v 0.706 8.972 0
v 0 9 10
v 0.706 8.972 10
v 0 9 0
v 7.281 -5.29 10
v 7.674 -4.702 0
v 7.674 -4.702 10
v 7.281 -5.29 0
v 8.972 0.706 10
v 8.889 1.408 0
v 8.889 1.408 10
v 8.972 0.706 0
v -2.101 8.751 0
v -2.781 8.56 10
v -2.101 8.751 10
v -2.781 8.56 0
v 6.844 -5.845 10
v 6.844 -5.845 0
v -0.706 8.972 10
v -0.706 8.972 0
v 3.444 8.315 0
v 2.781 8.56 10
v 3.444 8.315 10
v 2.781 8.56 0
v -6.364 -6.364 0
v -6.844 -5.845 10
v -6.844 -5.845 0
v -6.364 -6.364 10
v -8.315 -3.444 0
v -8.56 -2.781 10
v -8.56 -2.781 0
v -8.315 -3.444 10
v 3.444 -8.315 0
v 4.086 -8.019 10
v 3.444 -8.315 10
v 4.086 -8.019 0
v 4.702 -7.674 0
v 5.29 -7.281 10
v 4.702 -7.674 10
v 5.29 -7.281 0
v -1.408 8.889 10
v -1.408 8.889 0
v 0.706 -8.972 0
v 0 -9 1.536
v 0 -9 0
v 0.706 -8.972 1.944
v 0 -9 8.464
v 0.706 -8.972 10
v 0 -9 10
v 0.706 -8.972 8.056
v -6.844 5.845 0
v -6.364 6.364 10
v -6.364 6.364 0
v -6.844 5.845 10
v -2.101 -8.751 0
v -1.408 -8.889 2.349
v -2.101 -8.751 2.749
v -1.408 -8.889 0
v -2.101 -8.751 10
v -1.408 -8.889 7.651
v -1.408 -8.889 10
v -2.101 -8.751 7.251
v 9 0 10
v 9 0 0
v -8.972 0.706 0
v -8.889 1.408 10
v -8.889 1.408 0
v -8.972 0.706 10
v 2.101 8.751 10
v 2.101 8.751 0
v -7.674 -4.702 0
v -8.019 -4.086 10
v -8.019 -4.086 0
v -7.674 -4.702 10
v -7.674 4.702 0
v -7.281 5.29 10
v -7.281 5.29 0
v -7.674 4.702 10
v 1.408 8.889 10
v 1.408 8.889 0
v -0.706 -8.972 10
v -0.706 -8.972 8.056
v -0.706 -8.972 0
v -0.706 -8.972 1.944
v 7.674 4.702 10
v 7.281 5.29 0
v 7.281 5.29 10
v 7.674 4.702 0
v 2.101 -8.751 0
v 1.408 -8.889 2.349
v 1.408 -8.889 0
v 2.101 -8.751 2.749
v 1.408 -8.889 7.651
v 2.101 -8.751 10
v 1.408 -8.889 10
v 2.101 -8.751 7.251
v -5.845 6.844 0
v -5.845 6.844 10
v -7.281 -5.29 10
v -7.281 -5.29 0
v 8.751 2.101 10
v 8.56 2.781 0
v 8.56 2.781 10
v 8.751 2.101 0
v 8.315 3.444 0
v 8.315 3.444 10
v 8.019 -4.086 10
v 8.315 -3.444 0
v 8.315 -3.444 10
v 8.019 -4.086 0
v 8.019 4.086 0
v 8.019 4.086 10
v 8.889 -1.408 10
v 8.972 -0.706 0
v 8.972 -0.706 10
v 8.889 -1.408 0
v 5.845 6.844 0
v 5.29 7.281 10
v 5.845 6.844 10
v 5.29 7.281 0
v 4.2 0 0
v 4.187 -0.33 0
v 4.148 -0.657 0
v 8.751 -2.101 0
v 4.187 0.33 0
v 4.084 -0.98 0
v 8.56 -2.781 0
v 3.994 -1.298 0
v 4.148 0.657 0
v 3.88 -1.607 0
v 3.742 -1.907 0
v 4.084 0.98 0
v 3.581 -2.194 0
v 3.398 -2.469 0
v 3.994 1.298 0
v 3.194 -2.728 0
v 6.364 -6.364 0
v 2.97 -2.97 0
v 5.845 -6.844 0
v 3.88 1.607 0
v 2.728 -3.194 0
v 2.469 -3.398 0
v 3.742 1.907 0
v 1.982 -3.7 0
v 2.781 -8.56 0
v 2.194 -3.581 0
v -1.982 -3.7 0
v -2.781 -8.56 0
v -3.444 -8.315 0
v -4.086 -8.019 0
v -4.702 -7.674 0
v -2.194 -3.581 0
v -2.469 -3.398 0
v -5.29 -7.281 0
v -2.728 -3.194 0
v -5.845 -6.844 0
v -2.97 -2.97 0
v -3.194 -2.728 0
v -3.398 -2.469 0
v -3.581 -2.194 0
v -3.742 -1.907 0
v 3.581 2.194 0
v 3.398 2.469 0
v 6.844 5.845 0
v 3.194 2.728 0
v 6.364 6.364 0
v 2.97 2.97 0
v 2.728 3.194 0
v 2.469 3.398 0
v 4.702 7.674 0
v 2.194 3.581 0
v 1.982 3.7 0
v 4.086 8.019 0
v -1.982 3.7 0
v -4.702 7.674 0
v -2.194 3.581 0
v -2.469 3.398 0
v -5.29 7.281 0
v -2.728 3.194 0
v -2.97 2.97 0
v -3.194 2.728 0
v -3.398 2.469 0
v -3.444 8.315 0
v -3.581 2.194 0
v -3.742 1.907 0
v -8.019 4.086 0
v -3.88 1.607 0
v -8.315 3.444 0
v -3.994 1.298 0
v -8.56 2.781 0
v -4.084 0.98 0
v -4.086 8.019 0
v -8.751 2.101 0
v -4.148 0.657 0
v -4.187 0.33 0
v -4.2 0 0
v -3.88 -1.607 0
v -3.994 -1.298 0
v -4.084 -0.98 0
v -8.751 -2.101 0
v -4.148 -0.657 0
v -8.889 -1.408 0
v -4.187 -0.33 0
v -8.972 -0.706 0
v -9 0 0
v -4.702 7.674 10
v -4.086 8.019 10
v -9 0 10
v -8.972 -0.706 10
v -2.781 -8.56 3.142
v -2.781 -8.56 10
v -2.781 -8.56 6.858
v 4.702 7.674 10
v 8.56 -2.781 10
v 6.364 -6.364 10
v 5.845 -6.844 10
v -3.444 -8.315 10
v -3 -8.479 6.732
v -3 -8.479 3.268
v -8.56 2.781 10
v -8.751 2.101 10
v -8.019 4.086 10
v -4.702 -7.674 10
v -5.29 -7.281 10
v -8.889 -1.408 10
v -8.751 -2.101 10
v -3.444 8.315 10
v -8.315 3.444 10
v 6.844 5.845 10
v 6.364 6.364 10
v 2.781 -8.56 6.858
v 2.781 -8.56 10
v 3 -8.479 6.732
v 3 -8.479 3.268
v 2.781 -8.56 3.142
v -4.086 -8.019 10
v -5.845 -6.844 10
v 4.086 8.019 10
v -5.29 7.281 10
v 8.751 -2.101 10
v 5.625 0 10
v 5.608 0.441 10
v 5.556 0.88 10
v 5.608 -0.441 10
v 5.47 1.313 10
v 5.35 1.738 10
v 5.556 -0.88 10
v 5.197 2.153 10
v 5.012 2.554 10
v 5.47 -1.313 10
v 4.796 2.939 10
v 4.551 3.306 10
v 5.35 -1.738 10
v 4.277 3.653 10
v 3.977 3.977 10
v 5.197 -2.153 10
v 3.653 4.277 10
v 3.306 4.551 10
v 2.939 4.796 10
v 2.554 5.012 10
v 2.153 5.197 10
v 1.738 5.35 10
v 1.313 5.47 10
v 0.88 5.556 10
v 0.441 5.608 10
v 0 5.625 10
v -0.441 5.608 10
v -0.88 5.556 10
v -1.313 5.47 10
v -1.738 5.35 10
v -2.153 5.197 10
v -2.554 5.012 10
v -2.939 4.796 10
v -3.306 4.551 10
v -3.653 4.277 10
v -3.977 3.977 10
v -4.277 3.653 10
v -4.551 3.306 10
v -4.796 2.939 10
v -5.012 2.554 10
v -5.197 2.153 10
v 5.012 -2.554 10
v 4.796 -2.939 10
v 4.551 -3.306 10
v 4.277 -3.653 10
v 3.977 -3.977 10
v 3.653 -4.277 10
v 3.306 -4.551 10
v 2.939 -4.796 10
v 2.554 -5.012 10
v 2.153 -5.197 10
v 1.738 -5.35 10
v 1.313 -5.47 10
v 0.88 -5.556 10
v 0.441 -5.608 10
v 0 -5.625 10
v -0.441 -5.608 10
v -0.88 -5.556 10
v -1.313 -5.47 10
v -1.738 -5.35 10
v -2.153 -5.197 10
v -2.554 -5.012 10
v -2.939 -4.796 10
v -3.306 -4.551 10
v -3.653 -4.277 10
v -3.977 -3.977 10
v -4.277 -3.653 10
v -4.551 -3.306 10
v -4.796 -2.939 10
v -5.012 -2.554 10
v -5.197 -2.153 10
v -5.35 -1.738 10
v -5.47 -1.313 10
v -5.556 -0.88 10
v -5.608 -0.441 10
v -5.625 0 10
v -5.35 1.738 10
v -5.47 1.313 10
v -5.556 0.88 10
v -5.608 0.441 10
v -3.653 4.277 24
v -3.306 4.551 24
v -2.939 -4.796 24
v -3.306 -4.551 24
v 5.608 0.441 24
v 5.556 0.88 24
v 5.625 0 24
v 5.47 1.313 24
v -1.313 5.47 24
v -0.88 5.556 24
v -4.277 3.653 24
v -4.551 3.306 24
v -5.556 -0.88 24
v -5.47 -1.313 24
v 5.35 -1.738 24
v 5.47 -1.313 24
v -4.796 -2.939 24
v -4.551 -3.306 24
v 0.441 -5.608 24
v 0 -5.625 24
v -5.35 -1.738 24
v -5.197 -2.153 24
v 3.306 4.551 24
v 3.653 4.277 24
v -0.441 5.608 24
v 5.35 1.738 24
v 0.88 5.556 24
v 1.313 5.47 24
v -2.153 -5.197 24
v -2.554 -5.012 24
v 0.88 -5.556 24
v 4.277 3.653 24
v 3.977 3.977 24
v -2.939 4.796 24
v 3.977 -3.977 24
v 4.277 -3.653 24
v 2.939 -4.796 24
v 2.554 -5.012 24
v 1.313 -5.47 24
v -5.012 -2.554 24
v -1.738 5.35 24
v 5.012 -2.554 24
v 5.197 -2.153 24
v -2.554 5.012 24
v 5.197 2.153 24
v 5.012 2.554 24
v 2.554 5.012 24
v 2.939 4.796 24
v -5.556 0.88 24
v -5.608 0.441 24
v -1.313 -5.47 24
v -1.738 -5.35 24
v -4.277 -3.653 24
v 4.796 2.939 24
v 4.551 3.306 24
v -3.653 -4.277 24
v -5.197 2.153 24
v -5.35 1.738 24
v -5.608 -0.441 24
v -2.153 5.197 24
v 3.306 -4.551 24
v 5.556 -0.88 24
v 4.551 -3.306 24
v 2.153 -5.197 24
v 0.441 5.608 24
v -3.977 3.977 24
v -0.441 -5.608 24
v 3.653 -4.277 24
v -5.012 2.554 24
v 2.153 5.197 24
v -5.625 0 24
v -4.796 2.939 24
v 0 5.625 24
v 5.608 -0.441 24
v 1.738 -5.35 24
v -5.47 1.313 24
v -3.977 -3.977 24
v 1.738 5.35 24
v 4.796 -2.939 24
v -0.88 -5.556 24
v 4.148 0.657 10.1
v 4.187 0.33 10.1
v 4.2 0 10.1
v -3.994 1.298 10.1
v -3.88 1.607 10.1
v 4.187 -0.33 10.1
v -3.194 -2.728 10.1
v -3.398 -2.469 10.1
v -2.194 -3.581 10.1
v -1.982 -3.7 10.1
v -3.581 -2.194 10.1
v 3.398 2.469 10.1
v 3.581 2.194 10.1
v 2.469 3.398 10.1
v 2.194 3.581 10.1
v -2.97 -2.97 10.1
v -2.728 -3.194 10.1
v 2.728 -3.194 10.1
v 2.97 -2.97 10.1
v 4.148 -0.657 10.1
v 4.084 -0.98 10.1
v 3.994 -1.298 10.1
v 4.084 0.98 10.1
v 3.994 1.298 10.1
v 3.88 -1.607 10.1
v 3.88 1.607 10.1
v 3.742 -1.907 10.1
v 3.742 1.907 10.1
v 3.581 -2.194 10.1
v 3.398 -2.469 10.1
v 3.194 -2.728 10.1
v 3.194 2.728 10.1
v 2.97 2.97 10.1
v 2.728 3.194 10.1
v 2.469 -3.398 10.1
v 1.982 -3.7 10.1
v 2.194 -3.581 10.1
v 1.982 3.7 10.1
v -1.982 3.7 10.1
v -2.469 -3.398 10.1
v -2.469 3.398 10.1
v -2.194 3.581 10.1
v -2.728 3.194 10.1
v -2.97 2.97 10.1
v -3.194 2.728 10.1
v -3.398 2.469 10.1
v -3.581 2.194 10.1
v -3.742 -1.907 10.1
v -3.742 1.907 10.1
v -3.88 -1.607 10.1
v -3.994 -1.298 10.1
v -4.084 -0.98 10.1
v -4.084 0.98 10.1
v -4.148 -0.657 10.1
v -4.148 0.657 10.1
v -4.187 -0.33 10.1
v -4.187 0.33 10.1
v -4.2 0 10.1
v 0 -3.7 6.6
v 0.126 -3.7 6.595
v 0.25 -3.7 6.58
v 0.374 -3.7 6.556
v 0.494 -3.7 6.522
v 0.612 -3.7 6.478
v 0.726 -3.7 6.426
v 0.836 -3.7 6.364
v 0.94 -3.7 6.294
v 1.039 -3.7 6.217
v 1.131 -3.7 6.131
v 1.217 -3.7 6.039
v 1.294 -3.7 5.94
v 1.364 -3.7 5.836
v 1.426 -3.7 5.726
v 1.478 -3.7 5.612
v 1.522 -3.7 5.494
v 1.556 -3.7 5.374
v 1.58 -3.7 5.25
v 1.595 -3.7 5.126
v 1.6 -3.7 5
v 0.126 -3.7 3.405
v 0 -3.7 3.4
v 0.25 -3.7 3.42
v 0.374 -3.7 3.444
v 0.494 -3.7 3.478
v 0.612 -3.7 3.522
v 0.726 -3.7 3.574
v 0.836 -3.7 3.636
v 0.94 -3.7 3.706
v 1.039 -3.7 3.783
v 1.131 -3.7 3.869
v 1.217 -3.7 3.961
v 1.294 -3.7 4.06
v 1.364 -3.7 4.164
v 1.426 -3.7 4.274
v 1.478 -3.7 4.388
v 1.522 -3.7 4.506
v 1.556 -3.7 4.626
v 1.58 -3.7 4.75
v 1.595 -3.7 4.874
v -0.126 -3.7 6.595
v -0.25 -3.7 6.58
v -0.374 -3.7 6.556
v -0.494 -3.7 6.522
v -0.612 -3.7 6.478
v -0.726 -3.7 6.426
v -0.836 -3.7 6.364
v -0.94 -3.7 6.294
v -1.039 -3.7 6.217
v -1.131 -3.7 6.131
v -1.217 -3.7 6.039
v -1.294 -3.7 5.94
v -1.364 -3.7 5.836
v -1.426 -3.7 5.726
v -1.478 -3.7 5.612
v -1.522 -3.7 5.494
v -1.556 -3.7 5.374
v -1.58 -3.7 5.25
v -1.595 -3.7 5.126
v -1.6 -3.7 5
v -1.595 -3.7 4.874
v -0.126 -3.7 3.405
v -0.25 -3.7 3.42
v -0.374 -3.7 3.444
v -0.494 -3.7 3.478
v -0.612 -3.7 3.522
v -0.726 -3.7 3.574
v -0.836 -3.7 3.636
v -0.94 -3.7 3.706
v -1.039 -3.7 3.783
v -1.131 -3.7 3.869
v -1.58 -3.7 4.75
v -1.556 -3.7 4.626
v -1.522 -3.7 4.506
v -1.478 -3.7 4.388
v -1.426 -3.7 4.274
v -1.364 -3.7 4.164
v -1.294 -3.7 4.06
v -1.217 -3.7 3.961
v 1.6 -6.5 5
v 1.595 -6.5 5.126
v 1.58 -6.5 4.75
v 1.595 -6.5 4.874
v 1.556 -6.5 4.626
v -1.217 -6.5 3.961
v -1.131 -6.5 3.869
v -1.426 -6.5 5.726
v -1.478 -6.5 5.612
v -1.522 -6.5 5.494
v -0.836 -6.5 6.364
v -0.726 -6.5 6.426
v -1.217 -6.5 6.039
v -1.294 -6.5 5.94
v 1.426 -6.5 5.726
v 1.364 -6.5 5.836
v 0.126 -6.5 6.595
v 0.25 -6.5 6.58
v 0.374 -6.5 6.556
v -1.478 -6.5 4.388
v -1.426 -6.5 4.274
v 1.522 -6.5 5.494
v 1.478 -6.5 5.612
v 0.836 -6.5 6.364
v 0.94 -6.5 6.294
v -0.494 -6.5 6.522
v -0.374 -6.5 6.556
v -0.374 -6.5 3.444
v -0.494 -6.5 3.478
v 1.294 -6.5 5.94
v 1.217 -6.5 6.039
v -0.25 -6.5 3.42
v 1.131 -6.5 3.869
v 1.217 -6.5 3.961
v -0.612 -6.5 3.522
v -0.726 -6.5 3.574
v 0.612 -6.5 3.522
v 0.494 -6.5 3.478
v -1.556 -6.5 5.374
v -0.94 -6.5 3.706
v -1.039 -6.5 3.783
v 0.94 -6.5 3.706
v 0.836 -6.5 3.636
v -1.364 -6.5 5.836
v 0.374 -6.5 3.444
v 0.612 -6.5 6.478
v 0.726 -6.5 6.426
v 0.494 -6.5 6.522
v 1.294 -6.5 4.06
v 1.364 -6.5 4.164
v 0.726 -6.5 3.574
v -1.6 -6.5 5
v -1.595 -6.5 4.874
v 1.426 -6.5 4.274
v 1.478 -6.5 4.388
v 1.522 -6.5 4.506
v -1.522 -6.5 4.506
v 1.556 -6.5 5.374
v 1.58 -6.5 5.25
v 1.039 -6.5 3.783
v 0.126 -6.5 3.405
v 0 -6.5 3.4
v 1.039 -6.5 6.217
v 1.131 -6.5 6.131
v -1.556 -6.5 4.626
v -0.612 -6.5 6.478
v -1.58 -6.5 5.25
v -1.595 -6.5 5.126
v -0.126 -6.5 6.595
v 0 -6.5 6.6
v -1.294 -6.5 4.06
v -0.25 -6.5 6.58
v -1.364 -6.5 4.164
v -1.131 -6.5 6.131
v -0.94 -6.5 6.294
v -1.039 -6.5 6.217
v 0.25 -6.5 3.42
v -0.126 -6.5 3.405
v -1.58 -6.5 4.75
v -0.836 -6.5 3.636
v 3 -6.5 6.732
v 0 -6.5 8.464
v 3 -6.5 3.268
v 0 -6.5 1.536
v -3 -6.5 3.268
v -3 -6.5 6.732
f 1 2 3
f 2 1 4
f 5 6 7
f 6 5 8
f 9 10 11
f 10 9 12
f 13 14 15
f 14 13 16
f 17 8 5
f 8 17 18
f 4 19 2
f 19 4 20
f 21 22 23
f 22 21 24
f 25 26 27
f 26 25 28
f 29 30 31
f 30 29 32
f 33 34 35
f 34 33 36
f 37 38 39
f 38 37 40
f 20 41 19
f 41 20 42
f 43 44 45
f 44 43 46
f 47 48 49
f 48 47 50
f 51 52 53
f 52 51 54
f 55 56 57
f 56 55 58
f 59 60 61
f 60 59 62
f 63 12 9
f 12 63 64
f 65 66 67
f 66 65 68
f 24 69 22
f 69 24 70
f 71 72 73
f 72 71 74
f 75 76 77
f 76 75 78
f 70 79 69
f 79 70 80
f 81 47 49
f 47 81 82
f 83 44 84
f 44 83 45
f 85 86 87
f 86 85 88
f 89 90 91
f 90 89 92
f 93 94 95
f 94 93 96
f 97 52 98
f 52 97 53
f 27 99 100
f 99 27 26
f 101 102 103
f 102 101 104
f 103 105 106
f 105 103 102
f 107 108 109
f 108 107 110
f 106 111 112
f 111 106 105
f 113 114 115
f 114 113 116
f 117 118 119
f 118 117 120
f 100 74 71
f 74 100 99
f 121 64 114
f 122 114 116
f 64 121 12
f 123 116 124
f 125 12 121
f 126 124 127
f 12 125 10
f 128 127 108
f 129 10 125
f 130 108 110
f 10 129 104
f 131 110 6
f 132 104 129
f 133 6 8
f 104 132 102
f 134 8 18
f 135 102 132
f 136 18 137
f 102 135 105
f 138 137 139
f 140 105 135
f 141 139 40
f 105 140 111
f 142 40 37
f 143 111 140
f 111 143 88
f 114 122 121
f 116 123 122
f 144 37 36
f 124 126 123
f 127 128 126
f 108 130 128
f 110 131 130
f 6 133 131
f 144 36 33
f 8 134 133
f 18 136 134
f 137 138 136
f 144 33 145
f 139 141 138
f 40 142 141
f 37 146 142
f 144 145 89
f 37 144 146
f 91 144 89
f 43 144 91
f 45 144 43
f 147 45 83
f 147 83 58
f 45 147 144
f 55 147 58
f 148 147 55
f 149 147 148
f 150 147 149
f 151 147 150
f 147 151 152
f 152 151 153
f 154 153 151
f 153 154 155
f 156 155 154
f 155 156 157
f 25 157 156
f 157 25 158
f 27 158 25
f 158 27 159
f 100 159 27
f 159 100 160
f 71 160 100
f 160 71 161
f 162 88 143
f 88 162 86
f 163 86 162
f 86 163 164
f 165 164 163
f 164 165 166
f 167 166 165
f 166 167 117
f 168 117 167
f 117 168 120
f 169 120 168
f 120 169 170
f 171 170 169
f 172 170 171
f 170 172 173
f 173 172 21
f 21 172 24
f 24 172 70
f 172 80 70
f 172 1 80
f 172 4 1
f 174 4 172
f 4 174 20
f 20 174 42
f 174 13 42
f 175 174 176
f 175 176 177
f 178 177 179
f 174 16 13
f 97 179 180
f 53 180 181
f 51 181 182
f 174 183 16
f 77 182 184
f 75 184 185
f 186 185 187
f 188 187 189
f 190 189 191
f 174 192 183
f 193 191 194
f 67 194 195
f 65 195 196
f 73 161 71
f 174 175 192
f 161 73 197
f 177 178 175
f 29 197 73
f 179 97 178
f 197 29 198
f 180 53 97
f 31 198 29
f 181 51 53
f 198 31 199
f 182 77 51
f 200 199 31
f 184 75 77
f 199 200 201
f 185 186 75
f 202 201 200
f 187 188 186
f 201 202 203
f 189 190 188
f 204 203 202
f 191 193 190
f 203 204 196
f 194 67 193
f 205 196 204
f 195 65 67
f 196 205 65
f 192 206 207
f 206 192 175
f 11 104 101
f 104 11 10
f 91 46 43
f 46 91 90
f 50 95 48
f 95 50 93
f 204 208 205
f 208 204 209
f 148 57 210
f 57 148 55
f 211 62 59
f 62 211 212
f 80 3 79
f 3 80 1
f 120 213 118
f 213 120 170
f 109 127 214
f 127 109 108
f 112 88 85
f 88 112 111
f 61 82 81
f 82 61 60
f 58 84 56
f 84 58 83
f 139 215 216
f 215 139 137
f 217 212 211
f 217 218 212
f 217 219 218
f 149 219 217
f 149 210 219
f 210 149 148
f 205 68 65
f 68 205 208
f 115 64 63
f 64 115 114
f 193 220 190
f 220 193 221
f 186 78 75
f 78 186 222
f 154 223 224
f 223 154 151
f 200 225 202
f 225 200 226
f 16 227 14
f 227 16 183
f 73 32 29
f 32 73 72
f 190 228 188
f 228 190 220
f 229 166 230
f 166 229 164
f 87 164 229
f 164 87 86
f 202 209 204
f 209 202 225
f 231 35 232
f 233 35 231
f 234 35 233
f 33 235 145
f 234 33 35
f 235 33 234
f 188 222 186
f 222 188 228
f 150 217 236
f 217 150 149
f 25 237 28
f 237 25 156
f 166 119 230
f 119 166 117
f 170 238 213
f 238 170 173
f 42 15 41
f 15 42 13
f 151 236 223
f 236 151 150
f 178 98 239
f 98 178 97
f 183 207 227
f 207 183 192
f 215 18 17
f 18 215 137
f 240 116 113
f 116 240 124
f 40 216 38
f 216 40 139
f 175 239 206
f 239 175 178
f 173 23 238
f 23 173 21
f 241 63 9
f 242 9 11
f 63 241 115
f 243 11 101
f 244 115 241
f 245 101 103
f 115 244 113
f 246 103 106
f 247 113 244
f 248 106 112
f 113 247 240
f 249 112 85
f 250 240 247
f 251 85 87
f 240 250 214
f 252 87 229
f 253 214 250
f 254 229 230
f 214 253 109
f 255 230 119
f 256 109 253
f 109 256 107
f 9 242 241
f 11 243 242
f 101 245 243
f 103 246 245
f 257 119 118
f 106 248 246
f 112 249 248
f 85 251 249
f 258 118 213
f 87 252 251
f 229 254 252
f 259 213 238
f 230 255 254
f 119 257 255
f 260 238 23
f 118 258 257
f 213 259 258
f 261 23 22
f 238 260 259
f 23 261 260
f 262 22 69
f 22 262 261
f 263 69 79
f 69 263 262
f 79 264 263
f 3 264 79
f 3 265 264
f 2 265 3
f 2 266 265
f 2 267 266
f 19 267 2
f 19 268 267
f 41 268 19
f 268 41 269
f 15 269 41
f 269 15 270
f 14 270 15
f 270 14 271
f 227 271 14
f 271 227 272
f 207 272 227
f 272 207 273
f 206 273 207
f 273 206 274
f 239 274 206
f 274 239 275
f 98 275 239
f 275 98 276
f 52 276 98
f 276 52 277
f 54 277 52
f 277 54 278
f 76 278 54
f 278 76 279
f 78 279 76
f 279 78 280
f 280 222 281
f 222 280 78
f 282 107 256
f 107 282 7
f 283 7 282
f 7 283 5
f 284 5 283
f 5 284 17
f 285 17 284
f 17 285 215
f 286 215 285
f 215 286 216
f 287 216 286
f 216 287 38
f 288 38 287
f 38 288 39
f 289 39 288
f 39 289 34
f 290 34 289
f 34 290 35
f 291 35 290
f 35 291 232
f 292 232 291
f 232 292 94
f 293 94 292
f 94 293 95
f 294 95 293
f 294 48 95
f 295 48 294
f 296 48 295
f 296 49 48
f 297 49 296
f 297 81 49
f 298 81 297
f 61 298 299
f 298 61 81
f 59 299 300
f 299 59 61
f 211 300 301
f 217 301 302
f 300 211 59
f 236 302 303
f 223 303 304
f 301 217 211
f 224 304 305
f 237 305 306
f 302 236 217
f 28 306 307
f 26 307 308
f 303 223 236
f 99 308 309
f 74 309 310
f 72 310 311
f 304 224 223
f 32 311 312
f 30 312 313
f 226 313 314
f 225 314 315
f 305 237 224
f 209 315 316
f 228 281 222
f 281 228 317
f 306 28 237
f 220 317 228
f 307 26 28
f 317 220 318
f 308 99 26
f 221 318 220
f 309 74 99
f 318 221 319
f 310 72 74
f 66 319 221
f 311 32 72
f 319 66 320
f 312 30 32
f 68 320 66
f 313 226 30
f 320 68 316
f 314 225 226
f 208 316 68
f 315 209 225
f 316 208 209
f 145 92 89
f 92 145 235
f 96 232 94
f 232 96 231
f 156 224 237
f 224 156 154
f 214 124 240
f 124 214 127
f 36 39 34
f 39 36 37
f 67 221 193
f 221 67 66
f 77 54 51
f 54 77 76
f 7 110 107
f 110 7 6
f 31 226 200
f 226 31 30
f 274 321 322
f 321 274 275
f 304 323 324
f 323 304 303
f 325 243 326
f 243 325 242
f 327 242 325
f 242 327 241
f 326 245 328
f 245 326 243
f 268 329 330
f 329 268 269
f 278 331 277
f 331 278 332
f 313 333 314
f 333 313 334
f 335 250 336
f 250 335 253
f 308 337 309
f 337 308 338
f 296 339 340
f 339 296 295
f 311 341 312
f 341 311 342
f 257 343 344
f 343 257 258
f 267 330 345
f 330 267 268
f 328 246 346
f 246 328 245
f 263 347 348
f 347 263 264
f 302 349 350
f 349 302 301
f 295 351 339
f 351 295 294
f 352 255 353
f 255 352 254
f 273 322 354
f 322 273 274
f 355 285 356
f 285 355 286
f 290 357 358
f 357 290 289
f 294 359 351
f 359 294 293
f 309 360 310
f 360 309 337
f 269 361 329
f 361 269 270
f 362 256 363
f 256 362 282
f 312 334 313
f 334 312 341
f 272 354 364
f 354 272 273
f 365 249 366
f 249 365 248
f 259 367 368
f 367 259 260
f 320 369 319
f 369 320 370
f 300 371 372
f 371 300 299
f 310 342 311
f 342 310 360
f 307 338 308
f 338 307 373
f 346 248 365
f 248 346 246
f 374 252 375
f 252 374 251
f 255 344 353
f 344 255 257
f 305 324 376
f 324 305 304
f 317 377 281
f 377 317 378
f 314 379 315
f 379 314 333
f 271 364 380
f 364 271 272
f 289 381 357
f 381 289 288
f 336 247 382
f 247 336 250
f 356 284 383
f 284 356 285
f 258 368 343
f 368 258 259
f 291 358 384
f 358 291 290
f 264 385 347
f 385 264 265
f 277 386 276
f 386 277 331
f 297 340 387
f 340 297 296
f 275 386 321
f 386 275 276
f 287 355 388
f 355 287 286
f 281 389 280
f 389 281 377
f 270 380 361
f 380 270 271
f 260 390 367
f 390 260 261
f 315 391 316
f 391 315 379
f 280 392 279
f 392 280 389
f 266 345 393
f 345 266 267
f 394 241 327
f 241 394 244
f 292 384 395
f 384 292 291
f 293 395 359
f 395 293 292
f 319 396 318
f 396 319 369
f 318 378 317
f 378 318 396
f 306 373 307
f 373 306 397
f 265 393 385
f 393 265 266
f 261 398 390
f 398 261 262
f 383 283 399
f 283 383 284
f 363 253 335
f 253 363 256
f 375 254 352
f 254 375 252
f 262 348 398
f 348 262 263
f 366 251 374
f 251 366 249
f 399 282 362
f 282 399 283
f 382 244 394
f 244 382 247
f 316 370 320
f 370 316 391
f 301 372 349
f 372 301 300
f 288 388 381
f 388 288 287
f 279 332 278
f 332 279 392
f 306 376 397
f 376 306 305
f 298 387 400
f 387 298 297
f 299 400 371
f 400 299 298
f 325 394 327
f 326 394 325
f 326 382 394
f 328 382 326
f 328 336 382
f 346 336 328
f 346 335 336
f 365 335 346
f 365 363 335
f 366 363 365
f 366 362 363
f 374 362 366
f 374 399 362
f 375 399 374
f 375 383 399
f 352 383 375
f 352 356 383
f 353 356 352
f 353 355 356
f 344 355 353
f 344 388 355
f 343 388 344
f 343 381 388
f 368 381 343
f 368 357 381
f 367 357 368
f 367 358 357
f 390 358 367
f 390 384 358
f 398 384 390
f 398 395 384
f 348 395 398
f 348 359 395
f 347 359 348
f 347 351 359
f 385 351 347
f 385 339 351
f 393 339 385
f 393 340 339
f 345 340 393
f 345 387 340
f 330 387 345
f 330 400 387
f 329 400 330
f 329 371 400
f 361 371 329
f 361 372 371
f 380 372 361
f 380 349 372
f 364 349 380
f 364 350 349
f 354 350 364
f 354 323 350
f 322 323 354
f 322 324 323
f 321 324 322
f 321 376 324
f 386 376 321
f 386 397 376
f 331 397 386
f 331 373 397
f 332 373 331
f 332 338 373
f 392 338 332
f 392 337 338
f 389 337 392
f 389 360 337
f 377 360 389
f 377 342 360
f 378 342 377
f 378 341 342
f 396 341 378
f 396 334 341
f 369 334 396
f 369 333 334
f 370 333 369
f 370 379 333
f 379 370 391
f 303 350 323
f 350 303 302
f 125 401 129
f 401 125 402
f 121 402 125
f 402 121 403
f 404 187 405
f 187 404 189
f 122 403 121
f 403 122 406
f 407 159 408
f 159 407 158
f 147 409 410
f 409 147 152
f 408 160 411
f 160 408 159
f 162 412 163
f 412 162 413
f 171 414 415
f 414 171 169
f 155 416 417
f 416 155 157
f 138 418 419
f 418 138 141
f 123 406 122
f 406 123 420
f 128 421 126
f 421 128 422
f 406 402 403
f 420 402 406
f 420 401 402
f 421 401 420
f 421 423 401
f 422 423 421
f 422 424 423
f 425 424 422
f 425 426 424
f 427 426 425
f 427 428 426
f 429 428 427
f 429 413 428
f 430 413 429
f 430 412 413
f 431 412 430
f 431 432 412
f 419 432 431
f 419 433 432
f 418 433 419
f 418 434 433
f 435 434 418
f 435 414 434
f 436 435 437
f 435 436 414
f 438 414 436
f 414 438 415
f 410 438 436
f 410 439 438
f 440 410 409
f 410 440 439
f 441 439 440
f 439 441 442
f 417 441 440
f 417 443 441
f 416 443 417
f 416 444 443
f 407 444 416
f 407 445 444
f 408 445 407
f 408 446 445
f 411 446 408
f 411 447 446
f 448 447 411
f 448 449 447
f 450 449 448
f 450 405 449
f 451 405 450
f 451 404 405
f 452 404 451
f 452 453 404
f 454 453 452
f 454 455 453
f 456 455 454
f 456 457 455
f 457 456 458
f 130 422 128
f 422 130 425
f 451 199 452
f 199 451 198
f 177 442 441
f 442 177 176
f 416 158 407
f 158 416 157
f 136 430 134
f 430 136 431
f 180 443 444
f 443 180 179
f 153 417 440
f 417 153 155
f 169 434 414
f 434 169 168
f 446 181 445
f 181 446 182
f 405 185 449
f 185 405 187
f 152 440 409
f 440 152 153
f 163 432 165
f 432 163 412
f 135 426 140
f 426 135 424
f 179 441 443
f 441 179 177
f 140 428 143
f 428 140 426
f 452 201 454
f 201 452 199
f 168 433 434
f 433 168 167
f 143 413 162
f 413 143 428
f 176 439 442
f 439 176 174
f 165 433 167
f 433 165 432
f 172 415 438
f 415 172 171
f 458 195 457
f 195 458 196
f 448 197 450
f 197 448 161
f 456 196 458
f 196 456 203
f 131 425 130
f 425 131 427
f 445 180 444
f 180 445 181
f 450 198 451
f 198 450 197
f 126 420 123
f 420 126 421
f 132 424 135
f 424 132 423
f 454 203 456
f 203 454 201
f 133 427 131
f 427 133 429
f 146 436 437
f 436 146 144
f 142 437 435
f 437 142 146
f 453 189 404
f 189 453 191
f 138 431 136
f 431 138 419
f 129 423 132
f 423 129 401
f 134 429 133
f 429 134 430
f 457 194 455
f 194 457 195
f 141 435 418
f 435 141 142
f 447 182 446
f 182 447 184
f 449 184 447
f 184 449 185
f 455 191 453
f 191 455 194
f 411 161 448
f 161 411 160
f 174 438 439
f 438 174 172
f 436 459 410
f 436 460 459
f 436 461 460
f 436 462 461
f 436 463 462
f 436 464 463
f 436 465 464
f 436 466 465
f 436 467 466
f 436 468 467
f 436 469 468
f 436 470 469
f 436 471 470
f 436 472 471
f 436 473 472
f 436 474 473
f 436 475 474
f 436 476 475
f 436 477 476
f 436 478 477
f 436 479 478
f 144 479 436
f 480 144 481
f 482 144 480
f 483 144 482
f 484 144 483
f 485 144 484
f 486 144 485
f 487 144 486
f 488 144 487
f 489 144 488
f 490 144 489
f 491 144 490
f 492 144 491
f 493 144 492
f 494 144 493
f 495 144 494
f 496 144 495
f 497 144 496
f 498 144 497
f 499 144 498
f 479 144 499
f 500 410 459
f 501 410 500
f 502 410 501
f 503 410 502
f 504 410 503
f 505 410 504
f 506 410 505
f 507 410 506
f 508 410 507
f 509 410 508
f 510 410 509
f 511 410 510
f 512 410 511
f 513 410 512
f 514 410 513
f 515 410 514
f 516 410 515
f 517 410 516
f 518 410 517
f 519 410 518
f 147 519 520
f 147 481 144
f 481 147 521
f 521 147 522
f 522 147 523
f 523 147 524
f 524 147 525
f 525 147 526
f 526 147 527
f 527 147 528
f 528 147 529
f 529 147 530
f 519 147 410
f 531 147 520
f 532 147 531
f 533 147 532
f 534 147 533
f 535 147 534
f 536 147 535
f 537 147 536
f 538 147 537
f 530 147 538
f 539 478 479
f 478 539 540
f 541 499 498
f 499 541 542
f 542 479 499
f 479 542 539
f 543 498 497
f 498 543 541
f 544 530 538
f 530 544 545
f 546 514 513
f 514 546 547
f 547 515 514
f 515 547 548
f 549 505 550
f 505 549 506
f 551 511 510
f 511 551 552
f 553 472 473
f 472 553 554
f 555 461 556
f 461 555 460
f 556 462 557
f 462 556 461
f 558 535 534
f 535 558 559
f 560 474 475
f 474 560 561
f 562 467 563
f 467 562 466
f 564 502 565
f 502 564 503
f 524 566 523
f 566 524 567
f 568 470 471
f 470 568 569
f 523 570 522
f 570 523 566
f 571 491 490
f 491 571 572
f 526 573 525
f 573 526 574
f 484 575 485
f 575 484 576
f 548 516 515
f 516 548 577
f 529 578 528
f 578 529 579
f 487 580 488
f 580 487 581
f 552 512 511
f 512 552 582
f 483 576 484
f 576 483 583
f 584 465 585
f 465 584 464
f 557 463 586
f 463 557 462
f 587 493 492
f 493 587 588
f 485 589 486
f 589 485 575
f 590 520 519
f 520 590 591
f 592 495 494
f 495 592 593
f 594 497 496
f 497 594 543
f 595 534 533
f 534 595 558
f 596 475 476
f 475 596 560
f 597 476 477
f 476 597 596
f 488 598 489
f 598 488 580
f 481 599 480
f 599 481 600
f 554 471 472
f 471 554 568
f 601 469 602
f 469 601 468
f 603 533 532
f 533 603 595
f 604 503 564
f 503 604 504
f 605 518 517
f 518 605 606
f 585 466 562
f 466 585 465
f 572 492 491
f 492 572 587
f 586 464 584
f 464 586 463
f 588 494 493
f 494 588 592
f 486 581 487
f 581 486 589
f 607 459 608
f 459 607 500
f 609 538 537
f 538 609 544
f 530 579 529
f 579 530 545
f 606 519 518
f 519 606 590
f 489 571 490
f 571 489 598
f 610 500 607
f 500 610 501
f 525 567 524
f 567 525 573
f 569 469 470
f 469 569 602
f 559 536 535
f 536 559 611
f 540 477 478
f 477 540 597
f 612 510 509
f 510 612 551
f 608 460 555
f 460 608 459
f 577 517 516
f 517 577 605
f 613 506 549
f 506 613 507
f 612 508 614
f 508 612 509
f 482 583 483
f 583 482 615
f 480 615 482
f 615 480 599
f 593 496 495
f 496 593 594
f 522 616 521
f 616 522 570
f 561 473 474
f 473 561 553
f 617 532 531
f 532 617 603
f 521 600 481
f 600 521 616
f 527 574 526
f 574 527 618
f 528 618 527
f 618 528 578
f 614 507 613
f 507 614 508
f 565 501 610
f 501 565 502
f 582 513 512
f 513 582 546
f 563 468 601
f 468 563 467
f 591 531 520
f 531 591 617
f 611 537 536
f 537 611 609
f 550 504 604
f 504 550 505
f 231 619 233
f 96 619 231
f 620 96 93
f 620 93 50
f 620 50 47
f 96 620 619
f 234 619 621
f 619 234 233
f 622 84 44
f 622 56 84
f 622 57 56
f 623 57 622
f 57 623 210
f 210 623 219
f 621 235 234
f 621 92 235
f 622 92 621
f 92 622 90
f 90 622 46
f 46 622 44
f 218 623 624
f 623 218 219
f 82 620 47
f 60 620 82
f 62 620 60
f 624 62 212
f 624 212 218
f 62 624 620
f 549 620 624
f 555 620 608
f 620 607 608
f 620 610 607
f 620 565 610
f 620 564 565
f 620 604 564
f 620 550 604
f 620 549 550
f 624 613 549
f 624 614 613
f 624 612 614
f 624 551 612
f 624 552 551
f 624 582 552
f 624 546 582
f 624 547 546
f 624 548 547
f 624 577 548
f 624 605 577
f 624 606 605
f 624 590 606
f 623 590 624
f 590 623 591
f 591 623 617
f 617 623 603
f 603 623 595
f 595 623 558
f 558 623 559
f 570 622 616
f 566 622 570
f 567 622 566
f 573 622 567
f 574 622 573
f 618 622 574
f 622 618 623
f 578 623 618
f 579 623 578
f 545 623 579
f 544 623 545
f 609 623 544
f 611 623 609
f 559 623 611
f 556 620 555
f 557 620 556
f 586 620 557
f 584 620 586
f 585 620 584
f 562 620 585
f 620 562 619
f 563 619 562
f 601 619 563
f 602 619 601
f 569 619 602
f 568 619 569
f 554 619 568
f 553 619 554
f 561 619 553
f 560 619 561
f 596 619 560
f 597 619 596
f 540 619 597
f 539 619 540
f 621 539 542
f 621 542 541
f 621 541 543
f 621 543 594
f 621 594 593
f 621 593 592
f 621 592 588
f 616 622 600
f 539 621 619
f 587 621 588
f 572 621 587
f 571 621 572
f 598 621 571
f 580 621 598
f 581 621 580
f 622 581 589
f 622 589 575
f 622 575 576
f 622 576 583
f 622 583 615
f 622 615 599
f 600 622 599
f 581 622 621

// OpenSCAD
// Motor-to-Pulley Stepped Adapter
// Bottom: 8mm D-shaped bore (7mm flat) fits over motor shaft
// Top: 11.25mm stub inserts into pulley bore (measured 11.35mm)
// Set screw hole to lock onto motor shaft

// === PARAMETERS (adjust to tune fit) ===

// Motor shaft dimensions (measured: 7mm flat-to-flat)
shaft_dia = 8.4;          // ~8mm round side + 0.4mm clearance for 3D print
d_flat = 7.4;             // 7mm D-flat + 0.4mm clearance (was too tight at 6.9mm)
shaft_depth = 10;         // How deep the shaft inserts into adapter (mm)

// Pulley stub dimensions (measured: 11.35mm bore)
stub_dia = 11.25;         // Slightly under 11.35mm for snug press fit
stub_length = 14;         // How far stub inserts into pulley bore

// Collar (main body) dimensions
collar_dia = 18;          // Outer diameter of the collar section (wider than 11.25mm stub)
collar_height = shaft_depth; // Same as shaft bore depth

// Set screw
set_screw_dia = 3.2;      // M3 set screw hole (tap or use self-tapping)
set_screw_nut_dia = 6.0;  // M3 nut trap width (across flats)
set_screw_nut_depth = 2.5; // M3 nut trap depth

// === RESOLUTION ===
$fn = 80;

// === MODULES ===

// D-shaped bore (8mm round with 7mm flat)
module d_shaft_bore(diameter, flat_width, height) {
    intersection() {
        cylinder(d=diameter, h=height);
        translate([-(diameter/2), -(flat_width/2), 0])
            cube([diameter, flat_width, height]);
    }
}

// === MAIN ASSEMBLY ===
difference() {
    union() {
        // Bottom collar section
        cylinder(d=collar_dia, h=collar_height);
        
        // Top stub that inserts into pulley
        translate([0, 0, collar_height])
            cylinder(d=stub_dia, h=stub_length);
    }
    
    // D-shaped bore from bottom (motor shaft hole)
    translate([0, 0, -0.1])
        d_shaft_bore(shaft_dia, d_flat, shaft_depth + 0.2);
    
    // Set screw hole through collar wall (radial, hits the D-flat)
    // Positioned at mid-height of collar, pointing toward the flat
    translate([0, -(collar_dia/2 + 1), collar_height/2])
        rotate([-90, 0, 0])
            cylinder(d=set_screw_dia, h=collar_dia/2 + 2);
    
    // M3 nut trap on outside of set screw hole
    translate([0, -(collar_dia/2), collar_height/2])
        rotate([-90, 30, 0])
            cylinder(d=set_screw_nut_dia / cos(30), h=set_screw_nut_depth, $fn=6);
}

// === PRINT NOTES ===
// Print with stub pointing UP
// Material: PETG or PLA+ recommended for strength
// Layer height: 0.15-0.2mm for good bore accuracy
// Infill: 80-100%
// No supports needed
// 
// Assembly:
// 1. Slide D-bore onto motor shaft (may need light sanding)
// 2. Insert M3 set screw through nut trap to lock onto shaft
// 3. Press pulley onto the stub
//
// If fit is too loose/tight, adjust clearance values above
// and reprint. D-shaft tolerance is the most critical dimension.
